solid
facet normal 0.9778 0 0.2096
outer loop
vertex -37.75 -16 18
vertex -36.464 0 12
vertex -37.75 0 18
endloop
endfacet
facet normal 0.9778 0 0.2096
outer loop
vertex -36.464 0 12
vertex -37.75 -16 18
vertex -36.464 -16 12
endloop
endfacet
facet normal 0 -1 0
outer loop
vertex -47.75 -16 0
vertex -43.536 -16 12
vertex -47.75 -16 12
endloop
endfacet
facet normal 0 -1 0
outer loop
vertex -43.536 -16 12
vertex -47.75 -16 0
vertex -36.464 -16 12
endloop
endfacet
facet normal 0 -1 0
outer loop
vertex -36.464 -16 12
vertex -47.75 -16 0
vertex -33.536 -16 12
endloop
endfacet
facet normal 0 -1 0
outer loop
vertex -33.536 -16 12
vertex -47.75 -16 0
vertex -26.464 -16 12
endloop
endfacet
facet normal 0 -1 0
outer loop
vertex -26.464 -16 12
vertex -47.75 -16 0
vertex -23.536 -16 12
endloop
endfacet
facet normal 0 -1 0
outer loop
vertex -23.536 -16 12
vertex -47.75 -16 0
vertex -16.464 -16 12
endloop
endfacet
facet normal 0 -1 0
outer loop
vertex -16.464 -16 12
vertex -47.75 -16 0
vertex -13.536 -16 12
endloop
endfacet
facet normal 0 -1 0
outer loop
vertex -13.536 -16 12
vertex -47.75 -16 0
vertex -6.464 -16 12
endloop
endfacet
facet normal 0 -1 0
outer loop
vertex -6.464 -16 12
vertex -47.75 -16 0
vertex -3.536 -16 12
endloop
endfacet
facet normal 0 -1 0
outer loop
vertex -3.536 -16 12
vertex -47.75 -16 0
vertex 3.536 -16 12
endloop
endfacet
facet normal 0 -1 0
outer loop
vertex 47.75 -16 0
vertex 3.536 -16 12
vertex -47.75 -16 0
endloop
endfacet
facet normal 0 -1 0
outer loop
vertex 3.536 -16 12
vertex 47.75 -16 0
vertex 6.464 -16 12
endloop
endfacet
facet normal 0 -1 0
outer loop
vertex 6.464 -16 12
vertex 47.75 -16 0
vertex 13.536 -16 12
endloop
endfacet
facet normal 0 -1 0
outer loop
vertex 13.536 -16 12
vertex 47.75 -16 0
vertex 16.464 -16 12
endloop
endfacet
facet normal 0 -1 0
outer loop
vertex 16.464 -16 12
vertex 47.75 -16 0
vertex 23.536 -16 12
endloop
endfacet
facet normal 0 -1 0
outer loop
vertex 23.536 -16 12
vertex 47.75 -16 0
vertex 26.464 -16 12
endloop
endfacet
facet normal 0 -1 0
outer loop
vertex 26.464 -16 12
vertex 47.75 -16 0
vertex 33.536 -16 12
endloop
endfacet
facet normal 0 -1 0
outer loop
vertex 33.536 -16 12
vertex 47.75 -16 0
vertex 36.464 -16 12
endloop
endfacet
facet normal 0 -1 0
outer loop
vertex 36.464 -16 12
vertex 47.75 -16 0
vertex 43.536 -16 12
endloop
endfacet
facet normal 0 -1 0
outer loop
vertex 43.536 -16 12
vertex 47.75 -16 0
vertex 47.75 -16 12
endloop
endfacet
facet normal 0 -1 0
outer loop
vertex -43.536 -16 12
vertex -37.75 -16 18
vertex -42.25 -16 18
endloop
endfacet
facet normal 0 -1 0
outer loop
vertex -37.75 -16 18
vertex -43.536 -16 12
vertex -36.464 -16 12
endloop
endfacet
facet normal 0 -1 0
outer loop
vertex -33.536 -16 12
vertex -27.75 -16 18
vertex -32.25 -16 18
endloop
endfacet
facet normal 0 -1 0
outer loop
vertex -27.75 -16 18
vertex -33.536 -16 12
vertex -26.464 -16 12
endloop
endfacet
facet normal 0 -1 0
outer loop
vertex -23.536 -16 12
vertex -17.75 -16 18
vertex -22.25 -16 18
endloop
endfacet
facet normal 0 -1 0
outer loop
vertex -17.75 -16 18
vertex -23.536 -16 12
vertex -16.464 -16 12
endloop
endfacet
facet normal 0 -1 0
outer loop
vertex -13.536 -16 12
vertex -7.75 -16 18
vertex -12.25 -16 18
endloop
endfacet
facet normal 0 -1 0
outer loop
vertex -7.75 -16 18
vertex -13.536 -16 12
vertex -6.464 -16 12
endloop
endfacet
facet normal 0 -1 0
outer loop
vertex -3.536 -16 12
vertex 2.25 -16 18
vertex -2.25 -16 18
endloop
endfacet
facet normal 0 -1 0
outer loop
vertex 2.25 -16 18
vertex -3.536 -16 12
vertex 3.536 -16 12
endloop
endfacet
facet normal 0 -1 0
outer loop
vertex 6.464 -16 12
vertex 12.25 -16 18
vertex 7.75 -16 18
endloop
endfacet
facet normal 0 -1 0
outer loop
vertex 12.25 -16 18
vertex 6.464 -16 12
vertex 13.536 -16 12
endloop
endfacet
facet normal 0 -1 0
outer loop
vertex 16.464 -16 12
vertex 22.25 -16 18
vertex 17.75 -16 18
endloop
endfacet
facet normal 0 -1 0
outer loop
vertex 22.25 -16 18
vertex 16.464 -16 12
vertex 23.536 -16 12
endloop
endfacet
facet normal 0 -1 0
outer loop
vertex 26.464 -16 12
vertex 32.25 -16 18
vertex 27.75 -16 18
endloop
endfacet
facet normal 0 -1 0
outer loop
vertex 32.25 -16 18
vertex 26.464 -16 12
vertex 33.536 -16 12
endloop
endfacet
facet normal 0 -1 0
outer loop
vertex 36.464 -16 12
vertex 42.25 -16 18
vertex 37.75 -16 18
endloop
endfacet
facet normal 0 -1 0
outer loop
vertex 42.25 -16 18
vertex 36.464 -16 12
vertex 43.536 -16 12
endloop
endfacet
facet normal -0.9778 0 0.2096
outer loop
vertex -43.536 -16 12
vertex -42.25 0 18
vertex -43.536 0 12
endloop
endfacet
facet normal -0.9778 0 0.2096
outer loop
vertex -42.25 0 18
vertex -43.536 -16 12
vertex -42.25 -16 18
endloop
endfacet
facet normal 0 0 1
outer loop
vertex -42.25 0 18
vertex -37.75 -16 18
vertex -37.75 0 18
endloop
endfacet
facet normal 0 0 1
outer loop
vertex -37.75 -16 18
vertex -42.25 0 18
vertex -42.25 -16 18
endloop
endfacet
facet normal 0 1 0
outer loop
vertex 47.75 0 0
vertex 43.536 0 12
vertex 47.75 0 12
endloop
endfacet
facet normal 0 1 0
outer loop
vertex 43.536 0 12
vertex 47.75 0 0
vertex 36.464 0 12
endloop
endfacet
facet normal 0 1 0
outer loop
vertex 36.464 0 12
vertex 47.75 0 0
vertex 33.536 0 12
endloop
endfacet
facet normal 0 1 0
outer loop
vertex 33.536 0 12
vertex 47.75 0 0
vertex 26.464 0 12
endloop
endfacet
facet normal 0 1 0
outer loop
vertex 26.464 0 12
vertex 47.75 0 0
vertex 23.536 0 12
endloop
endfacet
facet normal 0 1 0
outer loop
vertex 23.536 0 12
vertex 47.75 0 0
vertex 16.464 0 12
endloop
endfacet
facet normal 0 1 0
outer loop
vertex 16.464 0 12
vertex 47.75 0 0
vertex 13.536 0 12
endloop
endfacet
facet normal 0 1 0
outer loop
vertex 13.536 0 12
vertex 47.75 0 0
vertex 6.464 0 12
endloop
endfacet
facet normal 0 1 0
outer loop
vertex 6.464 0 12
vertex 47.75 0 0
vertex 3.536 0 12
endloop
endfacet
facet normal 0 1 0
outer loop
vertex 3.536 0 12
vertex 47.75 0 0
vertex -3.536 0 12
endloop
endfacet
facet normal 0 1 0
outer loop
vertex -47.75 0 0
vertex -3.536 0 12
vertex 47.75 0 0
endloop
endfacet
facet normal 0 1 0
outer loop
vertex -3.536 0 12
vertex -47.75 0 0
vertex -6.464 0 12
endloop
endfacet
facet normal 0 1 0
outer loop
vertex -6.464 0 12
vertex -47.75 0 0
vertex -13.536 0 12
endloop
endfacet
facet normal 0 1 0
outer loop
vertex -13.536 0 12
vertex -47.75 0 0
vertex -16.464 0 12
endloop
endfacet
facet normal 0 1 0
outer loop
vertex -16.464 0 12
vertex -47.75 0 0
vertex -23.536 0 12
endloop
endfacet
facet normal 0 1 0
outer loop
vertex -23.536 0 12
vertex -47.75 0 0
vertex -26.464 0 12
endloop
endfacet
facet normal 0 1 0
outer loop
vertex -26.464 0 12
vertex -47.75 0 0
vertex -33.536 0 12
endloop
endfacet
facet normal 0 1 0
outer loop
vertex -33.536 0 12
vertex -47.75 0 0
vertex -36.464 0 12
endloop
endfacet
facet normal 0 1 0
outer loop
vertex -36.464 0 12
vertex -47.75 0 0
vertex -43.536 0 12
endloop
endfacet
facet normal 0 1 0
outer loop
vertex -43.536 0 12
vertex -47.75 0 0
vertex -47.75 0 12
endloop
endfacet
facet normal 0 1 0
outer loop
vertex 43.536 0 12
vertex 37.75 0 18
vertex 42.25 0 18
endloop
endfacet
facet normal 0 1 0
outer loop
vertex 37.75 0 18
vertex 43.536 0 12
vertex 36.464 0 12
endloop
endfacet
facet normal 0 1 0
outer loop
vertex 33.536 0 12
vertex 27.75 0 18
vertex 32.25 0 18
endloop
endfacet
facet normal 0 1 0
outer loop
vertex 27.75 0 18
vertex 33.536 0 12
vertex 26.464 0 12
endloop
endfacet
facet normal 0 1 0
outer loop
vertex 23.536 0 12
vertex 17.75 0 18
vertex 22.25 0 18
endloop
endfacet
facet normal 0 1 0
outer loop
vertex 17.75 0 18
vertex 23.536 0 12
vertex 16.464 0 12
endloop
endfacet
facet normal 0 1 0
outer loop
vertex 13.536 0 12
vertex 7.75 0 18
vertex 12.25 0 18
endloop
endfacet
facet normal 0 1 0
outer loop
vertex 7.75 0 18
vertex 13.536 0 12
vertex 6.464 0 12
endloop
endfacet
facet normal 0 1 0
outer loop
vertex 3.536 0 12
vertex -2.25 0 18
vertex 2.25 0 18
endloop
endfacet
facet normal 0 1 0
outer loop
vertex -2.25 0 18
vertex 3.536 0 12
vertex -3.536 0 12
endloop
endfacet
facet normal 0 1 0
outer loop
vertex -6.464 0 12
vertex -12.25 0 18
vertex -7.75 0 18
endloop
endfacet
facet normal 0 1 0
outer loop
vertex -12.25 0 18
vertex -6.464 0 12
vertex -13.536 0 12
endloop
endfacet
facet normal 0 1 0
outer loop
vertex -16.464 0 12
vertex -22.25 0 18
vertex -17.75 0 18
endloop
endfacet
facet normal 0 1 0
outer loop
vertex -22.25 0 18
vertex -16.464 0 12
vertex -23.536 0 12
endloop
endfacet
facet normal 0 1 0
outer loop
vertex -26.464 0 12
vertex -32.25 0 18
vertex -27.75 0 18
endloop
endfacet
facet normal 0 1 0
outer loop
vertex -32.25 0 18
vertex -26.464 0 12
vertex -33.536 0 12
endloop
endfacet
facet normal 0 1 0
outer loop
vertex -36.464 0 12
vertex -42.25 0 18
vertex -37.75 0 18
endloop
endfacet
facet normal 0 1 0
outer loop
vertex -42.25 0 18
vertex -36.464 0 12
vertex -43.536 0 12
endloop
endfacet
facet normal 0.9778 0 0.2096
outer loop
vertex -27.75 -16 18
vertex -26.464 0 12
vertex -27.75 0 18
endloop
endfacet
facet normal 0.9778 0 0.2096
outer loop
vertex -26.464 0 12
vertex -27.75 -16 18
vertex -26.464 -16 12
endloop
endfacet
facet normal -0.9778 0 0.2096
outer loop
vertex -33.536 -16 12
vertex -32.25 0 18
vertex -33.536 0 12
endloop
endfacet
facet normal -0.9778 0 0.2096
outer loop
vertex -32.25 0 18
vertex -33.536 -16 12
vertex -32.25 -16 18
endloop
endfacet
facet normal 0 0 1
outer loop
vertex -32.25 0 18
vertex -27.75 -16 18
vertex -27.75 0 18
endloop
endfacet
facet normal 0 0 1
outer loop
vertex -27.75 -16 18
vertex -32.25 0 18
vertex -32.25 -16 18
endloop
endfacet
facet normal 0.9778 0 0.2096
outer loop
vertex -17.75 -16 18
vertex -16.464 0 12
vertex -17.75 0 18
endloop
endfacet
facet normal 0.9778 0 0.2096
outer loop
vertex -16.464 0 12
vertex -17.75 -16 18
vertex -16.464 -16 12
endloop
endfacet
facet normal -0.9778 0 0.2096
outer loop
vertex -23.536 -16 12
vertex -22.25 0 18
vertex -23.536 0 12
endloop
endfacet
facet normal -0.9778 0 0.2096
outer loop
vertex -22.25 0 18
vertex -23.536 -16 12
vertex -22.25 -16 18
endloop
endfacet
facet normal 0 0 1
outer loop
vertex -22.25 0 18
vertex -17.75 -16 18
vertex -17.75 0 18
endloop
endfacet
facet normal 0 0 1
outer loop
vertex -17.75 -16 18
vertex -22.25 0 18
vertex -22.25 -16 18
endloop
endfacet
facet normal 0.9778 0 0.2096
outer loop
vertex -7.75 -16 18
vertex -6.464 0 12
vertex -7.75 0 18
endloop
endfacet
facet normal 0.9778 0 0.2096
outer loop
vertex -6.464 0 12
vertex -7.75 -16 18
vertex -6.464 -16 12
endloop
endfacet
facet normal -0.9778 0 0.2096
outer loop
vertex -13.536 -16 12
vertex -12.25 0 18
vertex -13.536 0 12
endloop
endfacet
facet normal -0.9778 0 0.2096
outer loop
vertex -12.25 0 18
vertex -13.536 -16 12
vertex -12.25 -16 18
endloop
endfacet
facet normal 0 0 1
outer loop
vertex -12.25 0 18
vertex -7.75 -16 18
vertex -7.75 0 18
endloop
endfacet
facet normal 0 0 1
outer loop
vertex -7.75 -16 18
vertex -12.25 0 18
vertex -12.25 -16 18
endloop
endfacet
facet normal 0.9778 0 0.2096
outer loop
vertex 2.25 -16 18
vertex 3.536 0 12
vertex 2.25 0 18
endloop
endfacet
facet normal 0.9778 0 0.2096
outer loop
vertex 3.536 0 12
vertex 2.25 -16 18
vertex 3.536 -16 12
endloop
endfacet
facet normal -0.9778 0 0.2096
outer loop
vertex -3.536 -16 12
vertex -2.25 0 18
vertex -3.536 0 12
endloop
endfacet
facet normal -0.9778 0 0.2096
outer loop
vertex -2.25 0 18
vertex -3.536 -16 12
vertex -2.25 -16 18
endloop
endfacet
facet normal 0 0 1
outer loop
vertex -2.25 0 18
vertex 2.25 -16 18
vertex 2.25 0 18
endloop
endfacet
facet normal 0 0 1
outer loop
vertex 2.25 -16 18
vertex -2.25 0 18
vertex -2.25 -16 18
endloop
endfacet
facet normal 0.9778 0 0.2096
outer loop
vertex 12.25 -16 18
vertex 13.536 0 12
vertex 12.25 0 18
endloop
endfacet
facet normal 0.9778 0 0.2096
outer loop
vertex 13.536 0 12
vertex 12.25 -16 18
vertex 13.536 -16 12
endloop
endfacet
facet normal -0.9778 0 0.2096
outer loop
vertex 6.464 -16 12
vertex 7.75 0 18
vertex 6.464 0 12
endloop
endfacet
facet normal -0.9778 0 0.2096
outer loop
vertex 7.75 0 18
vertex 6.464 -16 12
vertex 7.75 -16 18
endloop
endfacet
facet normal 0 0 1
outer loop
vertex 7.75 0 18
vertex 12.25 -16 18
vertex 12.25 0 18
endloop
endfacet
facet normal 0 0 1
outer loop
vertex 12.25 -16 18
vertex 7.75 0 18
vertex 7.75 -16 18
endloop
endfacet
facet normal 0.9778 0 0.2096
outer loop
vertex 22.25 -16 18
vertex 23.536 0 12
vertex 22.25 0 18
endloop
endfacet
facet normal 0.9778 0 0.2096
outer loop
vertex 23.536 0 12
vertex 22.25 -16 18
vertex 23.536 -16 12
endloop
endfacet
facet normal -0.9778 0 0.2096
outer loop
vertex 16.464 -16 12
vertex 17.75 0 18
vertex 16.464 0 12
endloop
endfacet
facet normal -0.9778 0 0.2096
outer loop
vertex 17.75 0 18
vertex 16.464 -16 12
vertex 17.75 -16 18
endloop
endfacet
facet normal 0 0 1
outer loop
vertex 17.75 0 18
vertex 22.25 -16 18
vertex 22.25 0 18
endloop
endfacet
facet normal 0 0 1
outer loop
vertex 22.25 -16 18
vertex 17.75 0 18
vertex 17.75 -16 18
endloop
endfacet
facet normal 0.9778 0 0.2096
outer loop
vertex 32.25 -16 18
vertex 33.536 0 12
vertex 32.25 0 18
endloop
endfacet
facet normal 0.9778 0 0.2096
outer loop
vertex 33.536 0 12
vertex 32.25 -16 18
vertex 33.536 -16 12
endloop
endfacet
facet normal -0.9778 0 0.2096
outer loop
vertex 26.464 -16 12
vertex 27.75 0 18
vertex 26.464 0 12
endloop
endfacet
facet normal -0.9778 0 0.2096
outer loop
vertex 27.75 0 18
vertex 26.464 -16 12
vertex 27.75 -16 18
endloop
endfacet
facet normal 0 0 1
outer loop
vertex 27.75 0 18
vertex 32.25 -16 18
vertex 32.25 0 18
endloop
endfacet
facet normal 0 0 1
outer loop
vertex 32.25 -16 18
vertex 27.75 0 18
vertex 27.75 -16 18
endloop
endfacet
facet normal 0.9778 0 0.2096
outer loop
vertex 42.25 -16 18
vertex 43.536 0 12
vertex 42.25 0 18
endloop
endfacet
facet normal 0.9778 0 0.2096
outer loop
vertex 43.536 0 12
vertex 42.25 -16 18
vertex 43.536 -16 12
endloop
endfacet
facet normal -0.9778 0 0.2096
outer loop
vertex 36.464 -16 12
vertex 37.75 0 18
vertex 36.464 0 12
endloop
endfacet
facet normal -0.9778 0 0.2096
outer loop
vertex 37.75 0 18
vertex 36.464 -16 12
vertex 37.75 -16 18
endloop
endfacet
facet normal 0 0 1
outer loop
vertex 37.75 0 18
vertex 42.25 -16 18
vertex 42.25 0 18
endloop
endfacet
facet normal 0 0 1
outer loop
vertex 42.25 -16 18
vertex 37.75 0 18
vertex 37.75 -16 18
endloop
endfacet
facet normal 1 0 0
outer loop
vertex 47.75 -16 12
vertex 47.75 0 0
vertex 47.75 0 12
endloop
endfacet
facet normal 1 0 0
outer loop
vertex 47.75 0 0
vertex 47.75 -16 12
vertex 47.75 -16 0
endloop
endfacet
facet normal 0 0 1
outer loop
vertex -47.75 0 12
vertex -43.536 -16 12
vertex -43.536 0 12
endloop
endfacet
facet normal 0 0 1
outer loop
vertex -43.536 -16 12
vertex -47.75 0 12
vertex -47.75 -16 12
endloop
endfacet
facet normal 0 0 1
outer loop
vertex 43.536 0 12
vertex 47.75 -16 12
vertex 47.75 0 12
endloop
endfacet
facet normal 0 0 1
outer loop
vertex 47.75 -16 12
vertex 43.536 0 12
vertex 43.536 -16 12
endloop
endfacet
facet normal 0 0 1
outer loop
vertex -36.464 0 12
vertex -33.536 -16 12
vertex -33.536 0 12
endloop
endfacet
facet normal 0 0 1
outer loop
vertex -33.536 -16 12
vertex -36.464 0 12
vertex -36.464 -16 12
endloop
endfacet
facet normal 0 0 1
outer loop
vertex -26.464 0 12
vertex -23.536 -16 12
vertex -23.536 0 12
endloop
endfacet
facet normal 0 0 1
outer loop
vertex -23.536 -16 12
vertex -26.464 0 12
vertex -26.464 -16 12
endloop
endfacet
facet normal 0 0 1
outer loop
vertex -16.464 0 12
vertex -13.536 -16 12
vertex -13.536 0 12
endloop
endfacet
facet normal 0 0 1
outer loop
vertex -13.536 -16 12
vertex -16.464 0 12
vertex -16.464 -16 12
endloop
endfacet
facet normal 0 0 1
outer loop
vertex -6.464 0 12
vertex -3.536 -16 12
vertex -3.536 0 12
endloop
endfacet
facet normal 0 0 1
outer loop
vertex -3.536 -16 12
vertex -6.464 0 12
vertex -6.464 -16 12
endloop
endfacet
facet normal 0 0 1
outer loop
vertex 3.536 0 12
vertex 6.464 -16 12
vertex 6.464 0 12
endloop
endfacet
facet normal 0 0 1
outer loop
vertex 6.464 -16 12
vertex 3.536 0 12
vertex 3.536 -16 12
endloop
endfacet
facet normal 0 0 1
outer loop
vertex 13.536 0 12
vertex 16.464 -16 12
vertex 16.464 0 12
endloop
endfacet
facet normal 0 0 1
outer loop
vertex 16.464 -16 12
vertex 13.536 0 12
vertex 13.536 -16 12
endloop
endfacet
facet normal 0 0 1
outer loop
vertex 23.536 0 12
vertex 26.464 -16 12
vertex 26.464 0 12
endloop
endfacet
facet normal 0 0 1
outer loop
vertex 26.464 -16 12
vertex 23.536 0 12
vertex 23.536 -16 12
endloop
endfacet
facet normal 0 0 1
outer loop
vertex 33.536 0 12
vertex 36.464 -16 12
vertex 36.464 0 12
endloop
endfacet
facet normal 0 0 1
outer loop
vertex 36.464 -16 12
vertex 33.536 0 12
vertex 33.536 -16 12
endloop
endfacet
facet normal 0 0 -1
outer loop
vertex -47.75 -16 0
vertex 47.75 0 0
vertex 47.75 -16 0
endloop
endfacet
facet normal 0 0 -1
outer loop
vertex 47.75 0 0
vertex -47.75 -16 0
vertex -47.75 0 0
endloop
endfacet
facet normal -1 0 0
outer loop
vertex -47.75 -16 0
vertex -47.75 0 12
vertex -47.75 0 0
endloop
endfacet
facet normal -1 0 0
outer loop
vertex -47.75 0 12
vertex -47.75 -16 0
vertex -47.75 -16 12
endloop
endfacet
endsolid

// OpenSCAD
$fn = 32;

// ----------------------------------------------------------------------
// Toothed rack, 9 teeth
// 10 mm pitch, 6 mm teeth
// ----------------------------------------------------------------------

// --- parameters (mm) ---
bar_w = 16;     // bar width (Y)
bar_h = 12;     // bar height (Z)
teeth = 9;      // number of teeth
pitch = 10;     // tooth pitch
tooth_h = 6;    // tooth height above the bar
root_w = 7.5;   // tooth width at the root
crest_w = 4.5;  // tooth width at the crest

// --- derived feature positions (mm) ---
span = (teeth - 1) * pitch;  // = 80   distance between the outer teeth
bar_l = span + root_w + 8;   // = 95.5   bar length: teeth plus 4 mm at each end
tooth_x = -span / 2;         // = -40   X of the first tooth
height = bar_h + tooth_h;    // = 18   overall height
feature_centers = [
  [tooth_x + 0 * pitch, -bar_w / 2],
  [tooth_x + 1 * pitch, -bar_w / 2],
  [tooth_x + 2 * pitch, -bar_w / 2],
  [tooth_x + 3 * pitch, -bar_w / 2],
  [tooth_x + 4 * pitch, -bar_w / 2],
  [tooth_x + 5 * pitch, -bar_w / 2],
  [tooth_x + 6 * pitch, -bar_w / 2],
  [tooth_x + 7 * pitch, -bar_w / 2],
  [tooth_x + 8 * pitch, -bar_w / 2]
];   // tooth centre line, drives the tooth loop

// bar with a rack of teeth, one extruded trapezoium per centre
module rack_tooth() {
  linear_extrude(height = bar_w)
    polygon(points = [
      [0, 0],
      [root_w, 0],
      [root_w / 2 + crest_w / 2, tooth_h + 1],
      [root_w / 2 - crest_w / 2, tooth_h + 1]
    ]);
}

union() {
  translate([-bar_l / 2, -bar_w, 0]) cube([bar_l, bar_w, bar_h]);
  for (centre = feature_centers)
    translate([centre[0] - root_w / 2, 0, bar_h - 1]) rotate([90, 0, 0]) rack_tooth();
}
